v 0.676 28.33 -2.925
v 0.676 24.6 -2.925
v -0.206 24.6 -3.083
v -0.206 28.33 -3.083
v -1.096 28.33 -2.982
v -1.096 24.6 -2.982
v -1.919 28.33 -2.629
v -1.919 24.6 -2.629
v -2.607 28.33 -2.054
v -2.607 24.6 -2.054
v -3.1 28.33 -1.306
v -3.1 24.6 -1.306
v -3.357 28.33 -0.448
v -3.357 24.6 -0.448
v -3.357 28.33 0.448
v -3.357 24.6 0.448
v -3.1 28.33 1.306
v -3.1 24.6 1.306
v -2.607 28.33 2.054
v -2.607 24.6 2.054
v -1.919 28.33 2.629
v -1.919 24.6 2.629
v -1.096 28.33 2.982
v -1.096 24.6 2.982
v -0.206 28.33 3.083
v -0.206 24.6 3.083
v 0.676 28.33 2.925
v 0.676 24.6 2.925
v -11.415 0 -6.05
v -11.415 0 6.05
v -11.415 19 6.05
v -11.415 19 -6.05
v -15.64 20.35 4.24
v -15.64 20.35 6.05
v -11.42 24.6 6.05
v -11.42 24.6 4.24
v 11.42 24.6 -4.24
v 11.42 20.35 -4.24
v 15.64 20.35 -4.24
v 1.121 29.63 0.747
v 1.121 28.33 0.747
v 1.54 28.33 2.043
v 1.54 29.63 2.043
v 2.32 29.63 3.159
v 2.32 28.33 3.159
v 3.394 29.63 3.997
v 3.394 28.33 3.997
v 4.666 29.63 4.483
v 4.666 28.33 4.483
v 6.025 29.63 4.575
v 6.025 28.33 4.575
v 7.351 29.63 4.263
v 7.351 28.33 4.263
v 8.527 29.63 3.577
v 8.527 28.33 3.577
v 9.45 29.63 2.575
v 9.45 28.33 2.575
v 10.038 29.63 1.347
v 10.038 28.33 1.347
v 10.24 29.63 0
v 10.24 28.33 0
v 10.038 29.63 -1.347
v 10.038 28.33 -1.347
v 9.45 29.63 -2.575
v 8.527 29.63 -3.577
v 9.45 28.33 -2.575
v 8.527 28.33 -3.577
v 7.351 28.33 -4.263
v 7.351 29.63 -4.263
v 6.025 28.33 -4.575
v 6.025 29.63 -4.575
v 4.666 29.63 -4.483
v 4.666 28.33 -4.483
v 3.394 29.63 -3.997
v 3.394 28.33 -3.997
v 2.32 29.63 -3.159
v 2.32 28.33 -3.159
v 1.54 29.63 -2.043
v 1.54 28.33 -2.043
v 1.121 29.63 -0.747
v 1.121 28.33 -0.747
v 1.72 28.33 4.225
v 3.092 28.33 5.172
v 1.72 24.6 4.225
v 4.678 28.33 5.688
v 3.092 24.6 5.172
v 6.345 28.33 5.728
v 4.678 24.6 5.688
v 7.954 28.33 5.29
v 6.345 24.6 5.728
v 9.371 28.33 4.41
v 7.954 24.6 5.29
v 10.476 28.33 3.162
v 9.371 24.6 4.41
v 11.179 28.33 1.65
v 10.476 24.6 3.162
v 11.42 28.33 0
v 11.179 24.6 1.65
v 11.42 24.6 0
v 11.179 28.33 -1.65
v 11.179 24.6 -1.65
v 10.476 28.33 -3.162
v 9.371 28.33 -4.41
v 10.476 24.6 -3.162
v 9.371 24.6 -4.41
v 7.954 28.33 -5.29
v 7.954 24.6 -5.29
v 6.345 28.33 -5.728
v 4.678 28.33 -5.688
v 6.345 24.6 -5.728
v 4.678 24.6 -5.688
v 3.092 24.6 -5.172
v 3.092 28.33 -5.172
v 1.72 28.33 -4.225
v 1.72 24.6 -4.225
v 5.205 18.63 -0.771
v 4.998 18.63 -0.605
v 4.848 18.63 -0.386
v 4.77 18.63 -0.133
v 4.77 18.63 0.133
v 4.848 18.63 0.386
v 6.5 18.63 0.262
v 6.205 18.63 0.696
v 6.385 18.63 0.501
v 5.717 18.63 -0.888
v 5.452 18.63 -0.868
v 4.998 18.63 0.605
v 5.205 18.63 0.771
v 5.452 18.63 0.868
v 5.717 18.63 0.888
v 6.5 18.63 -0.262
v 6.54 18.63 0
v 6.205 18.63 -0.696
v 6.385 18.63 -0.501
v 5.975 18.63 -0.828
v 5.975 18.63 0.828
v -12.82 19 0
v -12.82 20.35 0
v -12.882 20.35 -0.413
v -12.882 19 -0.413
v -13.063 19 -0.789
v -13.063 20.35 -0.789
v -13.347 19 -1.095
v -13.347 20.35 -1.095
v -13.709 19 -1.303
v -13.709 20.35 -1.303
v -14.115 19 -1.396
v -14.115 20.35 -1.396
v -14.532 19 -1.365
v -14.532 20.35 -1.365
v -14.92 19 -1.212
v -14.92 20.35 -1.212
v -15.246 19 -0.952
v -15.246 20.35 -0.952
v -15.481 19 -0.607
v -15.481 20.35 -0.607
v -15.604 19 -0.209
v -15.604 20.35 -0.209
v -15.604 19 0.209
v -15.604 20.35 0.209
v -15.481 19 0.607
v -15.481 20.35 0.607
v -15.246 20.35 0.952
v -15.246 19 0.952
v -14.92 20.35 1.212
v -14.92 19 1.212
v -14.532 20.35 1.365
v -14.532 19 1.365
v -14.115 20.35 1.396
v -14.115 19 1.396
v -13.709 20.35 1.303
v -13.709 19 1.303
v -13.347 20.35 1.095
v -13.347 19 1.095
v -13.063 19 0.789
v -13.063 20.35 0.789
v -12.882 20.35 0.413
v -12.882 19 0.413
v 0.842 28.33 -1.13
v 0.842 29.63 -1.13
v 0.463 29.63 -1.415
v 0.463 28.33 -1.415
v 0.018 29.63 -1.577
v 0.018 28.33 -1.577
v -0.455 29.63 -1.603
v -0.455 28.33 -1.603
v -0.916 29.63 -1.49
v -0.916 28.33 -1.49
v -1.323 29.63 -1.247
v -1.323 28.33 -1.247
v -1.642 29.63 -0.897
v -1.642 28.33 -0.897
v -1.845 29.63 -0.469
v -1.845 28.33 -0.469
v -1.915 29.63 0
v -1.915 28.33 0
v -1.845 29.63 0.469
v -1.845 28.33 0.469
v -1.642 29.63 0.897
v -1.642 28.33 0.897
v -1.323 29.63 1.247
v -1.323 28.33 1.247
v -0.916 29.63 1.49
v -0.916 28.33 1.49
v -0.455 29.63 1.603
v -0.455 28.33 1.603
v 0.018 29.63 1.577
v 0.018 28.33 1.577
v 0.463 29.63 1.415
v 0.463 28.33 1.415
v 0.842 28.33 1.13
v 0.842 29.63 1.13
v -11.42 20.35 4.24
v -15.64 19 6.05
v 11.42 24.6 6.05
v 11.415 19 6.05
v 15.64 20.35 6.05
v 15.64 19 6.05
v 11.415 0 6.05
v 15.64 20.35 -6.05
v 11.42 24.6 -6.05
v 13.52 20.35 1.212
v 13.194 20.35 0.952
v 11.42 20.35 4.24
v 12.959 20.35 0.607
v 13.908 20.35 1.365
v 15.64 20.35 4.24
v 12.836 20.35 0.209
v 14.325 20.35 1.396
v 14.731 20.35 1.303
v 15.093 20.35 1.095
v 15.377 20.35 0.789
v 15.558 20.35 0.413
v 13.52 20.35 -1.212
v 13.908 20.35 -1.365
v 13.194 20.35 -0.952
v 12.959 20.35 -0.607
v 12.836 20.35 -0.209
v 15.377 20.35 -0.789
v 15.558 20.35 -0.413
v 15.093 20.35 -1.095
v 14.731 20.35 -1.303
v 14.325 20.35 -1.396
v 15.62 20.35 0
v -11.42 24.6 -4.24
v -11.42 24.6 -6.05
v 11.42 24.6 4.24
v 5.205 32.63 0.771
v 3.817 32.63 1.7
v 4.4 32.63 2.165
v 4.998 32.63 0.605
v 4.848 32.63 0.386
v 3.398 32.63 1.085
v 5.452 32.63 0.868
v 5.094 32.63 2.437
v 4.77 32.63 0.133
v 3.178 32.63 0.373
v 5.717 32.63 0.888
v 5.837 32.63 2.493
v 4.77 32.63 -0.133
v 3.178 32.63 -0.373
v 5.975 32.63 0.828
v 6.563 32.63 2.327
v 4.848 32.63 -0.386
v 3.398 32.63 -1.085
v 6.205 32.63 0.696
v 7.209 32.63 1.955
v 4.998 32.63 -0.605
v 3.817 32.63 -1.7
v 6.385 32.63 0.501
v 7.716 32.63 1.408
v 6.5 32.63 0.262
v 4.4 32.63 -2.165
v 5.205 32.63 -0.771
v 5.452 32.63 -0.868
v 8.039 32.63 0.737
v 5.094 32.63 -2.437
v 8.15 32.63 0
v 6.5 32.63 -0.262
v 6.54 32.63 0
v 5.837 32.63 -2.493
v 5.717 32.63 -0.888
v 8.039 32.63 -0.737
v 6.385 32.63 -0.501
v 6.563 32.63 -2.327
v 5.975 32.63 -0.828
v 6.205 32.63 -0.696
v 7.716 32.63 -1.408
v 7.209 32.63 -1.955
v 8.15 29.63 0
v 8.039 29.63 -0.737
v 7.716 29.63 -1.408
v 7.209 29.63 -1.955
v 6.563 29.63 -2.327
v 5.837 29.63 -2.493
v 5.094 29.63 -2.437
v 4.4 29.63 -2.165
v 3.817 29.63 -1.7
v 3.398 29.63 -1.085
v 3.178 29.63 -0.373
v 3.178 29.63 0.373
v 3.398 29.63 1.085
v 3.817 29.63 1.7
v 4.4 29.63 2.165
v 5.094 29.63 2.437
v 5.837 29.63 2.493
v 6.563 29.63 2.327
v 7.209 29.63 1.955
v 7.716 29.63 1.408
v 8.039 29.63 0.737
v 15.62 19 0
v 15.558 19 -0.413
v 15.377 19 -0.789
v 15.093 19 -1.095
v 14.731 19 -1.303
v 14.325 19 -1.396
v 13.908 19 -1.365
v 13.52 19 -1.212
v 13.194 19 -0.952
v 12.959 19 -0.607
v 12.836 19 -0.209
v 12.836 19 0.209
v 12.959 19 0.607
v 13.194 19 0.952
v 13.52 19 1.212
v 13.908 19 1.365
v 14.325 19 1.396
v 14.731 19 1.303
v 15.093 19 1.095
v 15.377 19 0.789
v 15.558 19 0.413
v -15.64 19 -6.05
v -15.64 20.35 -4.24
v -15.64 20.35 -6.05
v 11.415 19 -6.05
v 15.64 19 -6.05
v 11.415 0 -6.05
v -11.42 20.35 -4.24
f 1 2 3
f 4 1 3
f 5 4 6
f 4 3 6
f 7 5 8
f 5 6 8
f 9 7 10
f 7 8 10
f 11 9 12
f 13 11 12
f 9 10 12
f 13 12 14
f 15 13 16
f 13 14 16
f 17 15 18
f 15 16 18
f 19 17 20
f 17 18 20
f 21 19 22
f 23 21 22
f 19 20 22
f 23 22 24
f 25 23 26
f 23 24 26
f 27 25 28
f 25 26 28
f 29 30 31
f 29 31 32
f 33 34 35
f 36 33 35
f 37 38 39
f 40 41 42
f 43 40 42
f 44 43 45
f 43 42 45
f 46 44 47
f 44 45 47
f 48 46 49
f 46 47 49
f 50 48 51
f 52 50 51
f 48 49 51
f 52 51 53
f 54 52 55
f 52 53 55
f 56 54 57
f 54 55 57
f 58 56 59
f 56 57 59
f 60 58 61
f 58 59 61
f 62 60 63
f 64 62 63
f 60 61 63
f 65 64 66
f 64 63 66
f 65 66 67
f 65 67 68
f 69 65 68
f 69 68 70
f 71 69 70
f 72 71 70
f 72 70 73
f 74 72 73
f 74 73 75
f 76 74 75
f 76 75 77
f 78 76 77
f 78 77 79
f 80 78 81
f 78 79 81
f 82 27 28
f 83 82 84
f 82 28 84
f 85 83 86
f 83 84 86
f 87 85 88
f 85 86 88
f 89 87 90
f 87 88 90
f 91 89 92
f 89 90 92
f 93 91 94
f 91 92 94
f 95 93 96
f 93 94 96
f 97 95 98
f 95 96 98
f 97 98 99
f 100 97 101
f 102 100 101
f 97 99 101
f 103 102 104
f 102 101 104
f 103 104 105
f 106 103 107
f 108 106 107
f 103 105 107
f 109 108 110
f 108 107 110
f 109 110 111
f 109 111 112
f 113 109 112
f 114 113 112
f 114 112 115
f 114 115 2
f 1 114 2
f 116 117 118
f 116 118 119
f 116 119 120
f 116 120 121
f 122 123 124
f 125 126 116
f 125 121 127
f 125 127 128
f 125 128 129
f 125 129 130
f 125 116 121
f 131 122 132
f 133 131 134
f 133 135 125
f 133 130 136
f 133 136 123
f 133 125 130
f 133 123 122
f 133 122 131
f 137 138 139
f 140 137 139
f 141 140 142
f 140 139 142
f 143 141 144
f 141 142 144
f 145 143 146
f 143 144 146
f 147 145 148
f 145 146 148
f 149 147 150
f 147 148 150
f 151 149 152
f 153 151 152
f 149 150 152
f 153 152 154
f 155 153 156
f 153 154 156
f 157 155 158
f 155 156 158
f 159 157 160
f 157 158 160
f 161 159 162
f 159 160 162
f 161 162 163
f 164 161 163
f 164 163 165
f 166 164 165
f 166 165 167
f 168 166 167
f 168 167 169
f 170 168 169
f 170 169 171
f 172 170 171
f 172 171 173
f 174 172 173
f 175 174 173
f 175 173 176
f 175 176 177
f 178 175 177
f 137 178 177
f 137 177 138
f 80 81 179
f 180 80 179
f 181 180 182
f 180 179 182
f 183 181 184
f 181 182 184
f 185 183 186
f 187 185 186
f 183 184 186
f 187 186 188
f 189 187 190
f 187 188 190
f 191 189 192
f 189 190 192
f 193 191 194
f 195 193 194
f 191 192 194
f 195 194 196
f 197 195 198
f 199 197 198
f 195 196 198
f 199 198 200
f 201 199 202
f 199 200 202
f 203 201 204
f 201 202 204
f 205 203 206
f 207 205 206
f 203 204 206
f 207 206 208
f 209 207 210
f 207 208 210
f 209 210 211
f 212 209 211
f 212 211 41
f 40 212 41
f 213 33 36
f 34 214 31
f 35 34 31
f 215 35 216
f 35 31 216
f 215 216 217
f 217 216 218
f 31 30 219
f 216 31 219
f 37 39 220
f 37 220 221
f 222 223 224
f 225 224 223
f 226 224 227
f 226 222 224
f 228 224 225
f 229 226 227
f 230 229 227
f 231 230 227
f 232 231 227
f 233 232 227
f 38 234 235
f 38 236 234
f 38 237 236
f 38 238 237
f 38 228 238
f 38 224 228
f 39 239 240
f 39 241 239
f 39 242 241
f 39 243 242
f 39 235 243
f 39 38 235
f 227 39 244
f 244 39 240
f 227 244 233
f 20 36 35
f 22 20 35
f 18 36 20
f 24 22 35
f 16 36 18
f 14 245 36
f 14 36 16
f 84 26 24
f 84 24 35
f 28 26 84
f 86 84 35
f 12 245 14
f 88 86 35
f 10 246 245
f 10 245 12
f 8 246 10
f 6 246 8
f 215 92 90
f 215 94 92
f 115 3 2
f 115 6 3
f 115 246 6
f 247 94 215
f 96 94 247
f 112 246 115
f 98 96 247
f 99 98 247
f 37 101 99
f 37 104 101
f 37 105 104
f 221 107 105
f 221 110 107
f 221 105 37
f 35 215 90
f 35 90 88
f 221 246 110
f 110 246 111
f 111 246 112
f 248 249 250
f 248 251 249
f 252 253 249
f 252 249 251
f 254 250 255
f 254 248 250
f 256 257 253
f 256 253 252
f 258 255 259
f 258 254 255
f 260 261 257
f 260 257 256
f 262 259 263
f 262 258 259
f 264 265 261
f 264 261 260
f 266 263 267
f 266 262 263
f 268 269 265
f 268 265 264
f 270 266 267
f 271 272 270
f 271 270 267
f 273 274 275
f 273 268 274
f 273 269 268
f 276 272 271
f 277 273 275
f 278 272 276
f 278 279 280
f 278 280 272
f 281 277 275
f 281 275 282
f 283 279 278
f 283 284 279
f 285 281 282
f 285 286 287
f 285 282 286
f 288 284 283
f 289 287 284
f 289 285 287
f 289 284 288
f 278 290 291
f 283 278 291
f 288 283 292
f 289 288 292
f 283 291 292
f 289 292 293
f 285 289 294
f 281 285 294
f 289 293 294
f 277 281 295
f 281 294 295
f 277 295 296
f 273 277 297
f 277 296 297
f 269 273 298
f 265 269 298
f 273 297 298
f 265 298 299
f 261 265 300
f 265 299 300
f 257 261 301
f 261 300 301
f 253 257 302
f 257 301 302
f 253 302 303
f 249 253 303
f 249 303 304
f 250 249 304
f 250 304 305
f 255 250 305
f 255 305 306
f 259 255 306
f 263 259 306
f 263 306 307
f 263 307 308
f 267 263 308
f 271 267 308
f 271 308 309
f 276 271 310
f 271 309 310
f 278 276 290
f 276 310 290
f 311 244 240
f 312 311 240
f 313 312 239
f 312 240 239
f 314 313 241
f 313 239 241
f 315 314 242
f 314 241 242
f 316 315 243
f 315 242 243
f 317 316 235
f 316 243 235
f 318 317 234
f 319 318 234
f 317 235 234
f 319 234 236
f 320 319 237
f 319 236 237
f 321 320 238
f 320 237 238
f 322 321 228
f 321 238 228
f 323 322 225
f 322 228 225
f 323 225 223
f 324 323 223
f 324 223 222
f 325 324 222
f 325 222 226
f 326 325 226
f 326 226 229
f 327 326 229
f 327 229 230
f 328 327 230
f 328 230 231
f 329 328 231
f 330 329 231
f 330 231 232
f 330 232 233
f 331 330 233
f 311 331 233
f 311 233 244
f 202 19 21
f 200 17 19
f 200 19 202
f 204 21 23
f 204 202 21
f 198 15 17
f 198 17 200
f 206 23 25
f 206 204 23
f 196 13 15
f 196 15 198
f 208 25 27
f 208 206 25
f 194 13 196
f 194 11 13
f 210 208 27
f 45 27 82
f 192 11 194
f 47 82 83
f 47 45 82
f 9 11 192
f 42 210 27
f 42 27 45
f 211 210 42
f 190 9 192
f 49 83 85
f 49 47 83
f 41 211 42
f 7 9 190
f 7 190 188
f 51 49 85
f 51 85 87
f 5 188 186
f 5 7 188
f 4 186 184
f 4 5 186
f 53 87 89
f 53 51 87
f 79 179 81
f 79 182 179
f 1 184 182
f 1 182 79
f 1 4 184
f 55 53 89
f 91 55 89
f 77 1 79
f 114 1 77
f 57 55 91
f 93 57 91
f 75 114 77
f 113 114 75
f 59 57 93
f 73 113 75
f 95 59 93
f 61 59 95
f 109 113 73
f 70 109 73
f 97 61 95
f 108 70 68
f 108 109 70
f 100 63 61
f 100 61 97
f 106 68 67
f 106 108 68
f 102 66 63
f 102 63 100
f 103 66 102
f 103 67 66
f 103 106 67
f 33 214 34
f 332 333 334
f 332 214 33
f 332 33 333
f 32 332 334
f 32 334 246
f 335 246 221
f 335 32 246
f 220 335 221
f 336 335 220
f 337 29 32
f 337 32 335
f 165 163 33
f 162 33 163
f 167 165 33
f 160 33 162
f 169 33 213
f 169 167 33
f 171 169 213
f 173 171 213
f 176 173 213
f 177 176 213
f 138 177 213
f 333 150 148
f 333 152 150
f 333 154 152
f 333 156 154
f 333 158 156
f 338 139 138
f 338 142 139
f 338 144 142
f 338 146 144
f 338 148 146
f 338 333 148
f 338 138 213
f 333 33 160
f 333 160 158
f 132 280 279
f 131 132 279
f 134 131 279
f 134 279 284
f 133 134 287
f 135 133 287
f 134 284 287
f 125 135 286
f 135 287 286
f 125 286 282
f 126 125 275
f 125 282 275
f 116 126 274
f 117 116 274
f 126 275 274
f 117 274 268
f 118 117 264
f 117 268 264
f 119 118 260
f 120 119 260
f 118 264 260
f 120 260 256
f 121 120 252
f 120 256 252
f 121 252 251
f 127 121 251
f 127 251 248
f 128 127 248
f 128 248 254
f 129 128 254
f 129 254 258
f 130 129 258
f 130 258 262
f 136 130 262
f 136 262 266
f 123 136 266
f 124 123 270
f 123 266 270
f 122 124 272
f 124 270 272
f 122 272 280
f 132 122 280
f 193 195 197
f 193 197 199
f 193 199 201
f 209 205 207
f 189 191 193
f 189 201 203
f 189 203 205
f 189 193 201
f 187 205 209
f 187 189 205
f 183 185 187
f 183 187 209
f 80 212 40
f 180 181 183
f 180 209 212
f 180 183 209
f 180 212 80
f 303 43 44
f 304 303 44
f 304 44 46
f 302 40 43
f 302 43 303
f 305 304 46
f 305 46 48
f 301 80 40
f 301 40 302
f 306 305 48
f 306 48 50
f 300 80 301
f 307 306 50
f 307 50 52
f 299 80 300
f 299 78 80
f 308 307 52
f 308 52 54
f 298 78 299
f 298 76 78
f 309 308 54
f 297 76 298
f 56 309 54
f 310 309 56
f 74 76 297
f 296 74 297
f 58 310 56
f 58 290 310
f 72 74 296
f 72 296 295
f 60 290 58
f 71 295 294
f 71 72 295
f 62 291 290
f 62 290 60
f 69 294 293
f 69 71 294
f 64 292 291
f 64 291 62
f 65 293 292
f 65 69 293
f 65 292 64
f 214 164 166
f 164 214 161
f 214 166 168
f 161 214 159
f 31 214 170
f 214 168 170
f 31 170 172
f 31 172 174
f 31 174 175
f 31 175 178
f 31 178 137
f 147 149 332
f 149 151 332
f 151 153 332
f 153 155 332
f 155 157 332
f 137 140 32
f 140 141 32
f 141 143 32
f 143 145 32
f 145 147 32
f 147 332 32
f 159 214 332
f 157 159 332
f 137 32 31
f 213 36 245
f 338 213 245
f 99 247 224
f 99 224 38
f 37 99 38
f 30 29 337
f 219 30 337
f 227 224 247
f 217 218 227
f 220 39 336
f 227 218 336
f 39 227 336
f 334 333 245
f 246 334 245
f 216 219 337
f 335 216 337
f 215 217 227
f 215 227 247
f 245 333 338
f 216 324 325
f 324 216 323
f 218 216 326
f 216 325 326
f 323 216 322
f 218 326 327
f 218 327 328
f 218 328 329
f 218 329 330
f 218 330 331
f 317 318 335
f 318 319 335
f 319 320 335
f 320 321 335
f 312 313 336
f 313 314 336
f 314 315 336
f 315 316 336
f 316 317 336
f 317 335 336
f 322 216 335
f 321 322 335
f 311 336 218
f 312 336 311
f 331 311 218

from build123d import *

# Parameters (mm, degrees)
SKETCH2_W           = 22.83
SKETCH2_H           = 12.1
BOSS_EXTRUDE1_DEPTH = 19
SKETCH3_W           = 31.28
SKETCH3_H           = 12.1
BOSS_EXTRUDE2_DEPTH = 5.6
CUT_EXTRUDE1_DEPTH  = 13.1
SKETCH6_W           = 4.22
SKETCH6_H           = 8.48
CUT_EXTRUDE2_DEPTH  = 4.25
CUT_EXTRUDE3_REACH  = 22.35
SKETCH7_R           = 1.4
SKETCH8_R           = 5.77
SKETCH8_R_2         = 3.085
BOSS_EXTRUDE3_DEPTH = 3.73
SKETCH9_R           = 4.59
SKETCH9_R_2         = 1.61
BOSS_EXTRUDE4_DEPTH = 1.3
SKETCH10_R          = 2.5
BOSS_EXTRUDE5_DEPTH = 3
SKETCH12_R          = 0.89
CUT_EXTRUDE4_DEPTH  = 14


with BuildPart() as part:
    # Sketch2 → Boss-Extrude1 (new body)
    with BuildSketch(Plane(origin=(0, 0, 0), x_dir=(1, 0, 0), z_dir=(0, 1, 0))):
        Rectangle(SKETCH2_W, SKETCH2_H)
    extrude(amount=BOSS_EXTRUDE1_DEPTH)

    # Sketch3 → Boss-Extrude2 (add)
    with BuildSketch(Plane(origin=(0, 19, 0), x_dir=(1, 0, 0), z_dir=(0, 1, 0))):
        Rectangle(SKETCH3_W, SKETCH3_H)
    extrude(amount=BOSS_EXTRUDE2_DEPTH)

    # Sketch5 → Cut-Extrude1 (cut, through all)
    with BuildSketch(Plane.XY.offset(6.05)):
        Polygon((-15.64, 20.35), (-11.42, 24.6), (-15.64, 24.6), align=None)
        Polygon((15.64, 24.6), (15.64, 20.35), (11.42, 24.6), align=None)
    extrude(amount=-CUT_EXTRUDE1_DEPTH, mode=Mode.SUBTRACT)

    # Sketch6 → Cut-Extrude2 (cut)
    with BuildSketch(Plane(origin=(0, 24.6, 0), x_dir=(1, 0, 0), z_dir=(0, 1, 0))):
        with Locations((13.53, 0)):
            Rectangle(SKETCH6_W, SKETCH6_H)
        with Locations((-13.53, 0)):
            Rectangle(SKETCH6_W, SKETCH6_H)
    extrude(amount=-CUT_EXTRUDE2_DEPTH, mode=Mode.SUBTRACT)

    # Sketch7 → Cut-Extrude3 (cut, up to next)
    with BuildSketch(Plane(origin=(0, 20.35, 0), x_dir=(1, 0, 0), z_dir=(0, 1, 0)), mode=Mode.PRIVATE) as cut_extrude3_sk1:
        with Locations((14.22, 0)):
            Circle(SKETCH7_R)
    cut_extrude3_tool1 = extrude(cut_extrude3_sk1.sketch, amount=-CUT_EXTRUDE3_REACH, mode=Mode.PRIVATE) & part.part
    add(cut_extrude3_tool1.solids().sort_by_distance((14.22, 20.35, 0))[0], mode=Mode.SUBTRACT)
    # Sketch7 → Cut-Extrude3 (cut, up to next)
    with BuildSketch(Plane(origin=(0, 20.35, 0), x_dir=(1, 0, 0), z_dir=(0, 1, 0)), mode=Mode.PRIVATE) as cut_extrude3_sk2:
        with Locations((-14.22, 0)):
            Circle(SKETCH7_R)
    cut_extrude3_tool2 = extrude(cut_extrude3_sk2.sketch, amount=-CUT_EXTRUDE3_REACH, mode=Mode.PRIVATE) & part.part
    add(cut_extrude3_tool2.solids().sort_by_distance((-14.22, 20.35, 0))[0], mode=Mode.SUBTRACT)

    # Sketch8 → Boss-Extrude3 (add)
    with BuildSketch(Plane(origin=(0, 24.6, 0), x_dir=(1, 0, 0), z_dir=(0, 1, 0))):
        with Locations((5.65, 0)):
            Circle(SKETCH8_R)
        with Locations((-0.305, 0)):
            Circle(SKETCH8_R_2)
    extrude(amount=BOSS_EXTRUDE3_DEPTH)

    # Sketch9 → Boss-Extrude4 (add)
    with BuildSketch(Plane(origin=(0, 28.33, 0), x_dir=(1, 0, 0), z_dir=(0, 1, 0))):
        with Locations((5.65, 0)):
            Circle(SKETCH9_R)
        with Locations((-0.305, 0)):
            Circle(SKETCH9_R_2)
    extrude(amount=BOSS_EXTRUDE4_DEPTH)

    # Sketch10 → Boss-Extrude5 (add)
    with BuildSketch(Plane(origin=(0, 29.63, 0), x_dir=(1, 0, 0), z_dir=(0, 1, 0))):
        with Locations((5.65, 0)):
            Circle(SKETCH10_R)
    extrude(amount=BOSS_EXTRUDE5_DEPTH)

    # Sketch12 → Cut-Extrude4 (cut)
    with BuildSketch(Plane(origin=(0, 32.63, 0), x_dir=(1, 0, 0), z_dir=(0, 1, 0))):
        with Locations((5.65, 0)):
            Circle(SKETCH12_R)
    extrude(amount=-CUT_EXTRUDE4_DEPTH, mode=Mode.SUBTRACT)


solid = part.part
